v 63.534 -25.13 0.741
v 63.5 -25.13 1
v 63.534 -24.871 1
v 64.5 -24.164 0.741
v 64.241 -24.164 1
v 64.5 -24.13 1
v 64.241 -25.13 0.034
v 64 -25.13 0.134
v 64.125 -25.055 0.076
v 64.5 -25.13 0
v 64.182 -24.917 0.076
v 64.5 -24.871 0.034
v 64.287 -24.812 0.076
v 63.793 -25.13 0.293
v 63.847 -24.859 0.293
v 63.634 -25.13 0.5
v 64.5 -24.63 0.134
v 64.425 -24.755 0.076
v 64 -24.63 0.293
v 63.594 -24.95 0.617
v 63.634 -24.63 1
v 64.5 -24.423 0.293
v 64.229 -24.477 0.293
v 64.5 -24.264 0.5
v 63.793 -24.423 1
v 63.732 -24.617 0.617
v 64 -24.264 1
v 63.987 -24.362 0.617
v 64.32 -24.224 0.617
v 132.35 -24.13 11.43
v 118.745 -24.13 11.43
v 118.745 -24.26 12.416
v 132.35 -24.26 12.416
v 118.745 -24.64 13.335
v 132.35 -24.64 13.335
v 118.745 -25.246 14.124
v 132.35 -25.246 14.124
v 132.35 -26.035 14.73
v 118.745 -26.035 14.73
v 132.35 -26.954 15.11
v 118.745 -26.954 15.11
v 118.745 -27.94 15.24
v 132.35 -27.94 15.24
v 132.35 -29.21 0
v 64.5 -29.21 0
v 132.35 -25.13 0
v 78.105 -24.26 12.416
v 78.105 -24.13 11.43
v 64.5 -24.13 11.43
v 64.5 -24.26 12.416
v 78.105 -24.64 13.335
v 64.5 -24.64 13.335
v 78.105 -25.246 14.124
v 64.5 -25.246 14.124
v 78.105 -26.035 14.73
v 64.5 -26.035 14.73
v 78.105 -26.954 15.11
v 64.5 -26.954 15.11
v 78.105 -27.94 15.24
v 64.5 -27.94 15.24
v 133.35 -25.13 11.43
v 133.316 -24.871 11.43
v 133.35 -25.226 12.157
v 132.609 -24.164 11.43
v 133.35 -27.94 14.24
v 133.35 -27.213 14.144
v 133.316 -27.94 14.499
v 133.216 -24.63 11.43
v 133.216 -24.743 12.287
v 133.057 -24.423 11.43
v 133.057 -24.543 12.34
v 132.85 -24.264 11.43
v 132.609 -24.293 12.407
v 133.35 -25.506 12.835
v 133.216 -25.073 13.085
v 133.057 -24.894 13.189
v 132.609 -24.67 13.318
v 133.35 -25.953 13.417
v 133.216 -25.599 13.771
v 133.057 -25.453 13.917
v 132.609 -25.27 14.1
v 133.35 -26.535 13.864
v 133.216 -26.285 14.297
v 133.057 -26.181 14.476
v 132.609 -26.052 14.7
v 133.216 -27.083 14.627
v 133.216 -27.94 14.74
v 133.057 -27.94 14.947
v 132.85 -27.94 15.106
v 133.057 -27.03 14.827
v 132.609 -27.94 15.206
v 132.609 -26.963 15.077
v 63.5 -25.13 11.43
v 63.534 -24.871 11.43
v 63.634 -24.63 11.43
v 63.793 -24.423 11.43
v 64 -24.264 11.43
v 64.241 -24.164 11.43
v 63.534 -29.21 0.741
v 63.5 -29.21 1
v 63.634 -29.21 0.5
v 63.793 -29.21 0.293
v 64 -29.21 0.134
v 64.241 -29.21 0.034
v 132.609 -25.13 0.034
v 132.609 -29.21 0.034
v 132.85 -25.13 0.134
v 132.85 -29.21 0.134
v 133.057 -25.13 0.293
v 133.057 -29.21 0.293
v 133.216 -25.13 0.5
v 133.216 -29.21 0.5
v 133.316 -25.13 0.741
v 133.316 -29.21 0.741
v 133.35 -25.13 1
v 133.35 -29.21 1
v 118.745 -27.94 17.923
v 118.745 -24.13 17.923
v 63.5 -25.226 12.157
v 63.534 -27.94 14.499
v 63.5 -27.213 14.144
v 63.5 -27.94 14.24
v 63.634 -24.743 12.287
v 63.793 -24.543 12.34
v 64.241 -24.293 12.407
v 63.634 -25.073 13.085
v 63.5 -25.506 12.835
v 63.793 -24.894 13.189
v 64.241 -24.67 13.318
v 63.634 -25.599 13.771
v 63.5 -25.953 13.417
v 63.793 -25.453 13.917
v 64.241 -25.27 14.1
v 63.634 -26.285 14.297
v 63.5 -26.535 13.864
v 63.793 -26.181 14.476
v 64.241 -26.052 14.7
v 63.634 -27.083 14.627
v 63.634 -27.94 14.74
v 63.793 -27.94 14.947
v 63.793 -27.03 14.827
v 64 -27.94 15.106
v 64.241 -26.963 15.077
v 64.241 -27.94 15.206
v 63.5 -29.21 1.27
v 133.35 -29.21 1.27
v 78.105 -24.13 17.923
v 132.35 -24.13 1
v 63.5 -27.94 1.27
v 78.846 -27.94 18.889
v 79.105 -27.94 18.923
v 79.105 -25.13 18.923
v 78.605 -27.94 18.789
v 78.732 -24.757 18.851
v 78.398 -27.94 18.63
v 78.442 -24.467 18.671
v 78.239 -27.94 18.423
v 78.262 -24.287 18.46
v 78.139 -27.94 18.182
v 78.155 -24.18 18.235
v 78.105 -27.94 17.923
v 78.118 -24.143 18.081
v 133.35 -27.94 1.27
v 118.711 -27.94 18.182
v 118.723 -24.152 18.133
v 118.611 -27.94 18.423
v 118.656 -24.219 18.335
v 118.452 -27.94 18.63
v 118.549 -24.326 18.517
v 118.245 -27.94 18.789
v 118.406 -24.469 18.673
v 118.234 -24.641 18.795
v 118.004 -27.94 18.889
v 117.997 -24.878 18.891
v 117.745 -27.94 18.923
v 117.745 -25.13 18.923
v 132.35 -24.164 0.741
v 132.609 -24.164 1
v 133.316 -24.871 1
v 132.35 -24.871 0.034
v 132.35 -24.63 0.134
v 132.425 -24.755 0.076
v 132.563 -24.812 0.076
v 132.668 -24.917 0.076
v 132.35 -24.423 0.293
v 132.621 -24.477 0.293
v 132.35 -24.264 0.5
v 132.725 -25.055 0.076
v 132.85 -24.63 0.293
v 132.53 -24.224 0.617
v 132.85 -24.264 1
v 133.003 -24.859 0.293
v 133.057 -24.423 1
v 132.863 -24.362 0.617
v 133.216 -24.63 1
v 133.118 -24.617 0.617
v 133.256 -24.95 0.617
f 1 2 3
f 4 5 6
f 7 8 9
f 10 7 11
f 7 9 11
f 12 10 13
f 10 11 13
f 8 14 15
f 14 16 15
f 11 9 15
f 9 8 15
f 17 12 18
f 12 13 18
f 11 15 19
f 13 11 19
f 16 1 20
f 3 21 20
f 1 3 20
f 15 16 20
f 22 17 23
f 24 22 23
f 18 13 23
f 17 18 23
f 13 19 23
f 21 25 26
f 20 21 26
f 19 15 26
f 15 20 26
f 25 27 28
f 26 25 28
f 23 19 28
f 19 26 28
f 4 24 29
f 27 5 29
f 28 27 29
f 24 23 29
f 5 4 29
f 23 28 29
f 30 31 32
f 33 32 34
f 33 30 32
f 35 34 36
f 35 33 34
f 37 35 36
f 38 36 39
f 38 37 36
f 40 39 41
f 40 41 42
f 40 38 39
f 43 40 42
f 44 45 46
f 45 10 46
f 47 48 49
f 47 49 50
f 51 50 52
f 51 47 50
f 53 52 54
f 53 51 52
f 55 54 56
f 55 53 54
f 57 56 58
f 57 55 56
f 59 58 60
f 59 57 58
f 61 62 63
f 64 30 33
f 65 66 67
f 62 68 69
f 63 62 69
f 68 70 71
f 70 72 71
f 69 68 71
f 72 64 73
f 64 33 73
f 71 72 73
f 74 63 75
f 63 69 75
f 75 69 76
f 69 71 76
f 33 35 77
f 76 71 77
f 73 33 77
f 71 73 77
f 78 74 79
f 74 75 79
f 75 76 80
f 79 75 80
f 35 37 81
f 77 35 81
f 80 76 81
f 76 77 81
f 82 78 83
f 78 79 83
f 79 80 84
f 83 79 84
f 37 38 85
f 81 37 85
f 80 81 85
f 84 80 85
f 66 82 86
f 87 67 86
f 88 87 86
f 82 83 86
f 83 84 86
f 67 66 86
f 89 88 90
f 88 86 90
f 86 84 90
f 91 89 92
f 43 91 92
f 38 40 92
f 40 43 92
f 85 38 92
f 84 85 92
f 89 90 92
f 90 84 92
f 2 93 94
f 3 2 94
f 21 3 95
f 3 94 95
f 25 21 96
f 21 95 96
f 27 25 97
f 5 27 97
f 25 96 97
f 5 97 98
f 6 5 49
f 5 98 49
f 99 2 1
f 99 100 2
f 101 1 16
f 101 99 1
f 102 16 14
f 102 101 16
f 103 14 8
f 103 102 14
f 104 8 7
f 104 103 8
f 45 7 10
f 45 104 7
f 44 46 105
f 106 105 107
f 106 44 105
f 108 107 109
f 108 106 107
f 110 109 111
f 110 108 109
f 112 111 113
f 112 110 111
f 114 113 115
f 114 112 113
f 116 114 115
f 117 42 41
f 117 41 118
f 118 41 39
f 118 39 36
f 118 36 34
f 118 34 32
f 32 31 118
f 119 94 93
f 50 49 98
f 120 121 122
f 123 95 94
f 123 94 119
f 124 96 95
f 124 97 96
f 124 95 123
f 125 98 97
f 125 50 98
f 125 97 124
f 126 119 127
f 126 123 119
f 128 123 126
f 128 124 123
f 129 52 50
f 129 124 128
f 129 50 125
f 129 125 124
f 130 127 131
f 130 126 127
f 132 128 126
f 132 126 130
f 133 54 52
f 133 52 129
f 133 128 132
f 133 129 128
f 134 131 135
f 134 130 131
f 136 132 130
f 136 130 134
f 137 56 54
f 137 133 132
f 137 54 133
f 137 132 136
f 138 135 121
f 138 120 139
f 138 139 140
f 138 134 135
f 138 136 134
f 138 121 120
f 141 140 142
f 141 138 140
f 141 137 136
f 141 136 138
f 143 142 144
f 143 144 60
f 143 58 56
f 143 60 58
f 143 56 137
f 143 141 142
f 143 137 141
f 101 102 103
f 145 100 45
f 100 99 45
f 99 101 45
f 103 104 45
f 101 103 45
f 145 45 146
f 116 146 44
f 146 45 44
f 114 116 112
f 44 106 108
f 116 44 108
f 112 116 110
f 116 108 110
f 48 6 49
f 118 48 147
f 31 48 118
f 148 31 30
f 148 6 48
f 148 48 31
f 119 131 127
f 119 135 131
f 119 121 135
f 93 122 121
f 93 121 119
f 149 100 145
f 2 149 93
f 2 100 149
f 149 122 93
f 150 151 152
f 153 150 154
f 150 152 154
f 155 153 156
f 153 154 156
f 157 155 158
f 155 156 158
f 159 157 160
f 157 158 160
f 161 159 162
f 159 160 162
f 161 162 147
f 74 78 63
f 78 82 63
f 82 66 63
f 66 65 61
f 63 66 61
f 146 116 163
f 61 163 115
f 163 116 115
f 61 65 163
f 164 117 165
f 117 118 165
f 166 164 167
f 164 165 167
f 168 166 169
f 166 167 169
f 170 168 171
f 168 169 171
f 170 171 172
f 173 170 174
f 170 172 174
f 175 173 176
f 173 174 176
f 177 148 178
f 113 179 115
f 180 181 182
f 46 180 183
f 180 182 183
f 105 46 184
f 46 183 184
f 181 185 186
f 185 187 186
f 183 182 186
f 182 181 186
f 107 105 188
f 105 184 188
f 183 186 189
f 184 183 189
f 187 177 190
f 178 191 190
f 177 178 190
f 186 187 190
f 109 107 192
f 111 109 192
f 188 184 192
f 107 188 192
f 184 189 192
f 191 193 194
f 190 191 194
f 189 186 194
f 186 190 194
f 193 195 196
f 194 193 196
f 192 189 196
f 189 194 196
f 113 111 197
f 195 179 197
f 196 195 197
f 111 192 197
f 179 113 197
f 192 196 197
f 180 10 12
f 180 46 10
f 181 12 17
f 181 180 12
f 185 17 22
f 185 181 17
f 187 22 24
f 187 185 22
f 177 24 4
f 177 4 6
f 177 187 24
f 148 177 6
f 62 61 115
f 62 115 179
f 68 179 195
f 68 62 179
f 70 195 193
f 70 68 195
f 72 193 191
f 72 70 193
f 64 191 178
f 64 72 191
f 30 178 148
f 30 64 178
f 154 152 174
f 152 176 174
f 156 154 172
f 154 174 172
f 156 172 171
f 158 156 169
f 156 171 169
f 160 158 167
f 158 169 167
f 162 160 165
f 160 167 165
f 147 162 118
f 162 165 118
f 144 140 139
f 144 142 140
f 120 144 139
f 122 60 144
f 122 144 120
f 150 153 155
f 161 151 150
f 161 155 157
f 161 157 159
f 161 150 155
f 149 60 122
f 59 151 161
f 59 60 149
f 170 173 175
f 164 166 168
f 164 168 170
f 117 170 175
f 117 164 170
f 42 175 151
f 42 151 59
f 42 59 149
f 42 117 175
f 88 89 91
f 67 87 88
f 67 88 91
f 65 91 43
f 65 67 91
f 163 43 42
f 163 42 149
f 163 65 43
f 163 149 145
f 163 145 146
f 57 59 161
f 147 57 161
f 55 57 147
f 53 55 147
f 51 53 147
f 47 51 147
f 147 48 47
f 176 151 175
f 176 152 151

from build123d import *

# Parameters (mm, degrees)
EXTRUDE003_DEPTH = 69.85
BOX024_W         = 40.64
BOX024_H         = 3.81
BOX024_DEPTH     = 7.62
BOX025_W         = 69.85
BOX025_H         = 1.27
BOX025_DEPTH     = 1.27
BOX023_W         = 69.85
BOX023_H         = 3.81
BOX023_DEPTH     = 11.43
FILLET002_R      = 1


with BuildPart() as extrude003:
    # Sketch001 (on Face2 of Box023) → Extrude003 (new body)
    with BuildSketch(Plane.YZ.offset(69.85)):
        with BuildLine():
            ThreePointArc((3.81, 11.43), (2.694077, 14.124077), (0, 15.24))
            Line((0, 15.24), (0, 11.43))
            Line((0, 11.43), (3.81, 11.43))
        make_face()
    extrude(amount=-EXTRUDE003_DEPTH)


with BuildPart() as cube024:
    # Box024 → Box024 (new body)
    with BuildSketch(Plane(origin=(14.605, 0, 11.303), x_dir=(1, 0, 0), z_dir=(0, 0, 1))):
        with Locations((20.32, 1.905)):
            Rectangle(BOX024_W, BOX024_H)
    extrude(amount=BOX024_DEPTH)


with BuildPart() as cube025:
    # Box025 → Box025 (new body)
    with BuildSketch(Plane(origin=(0, -1.27, 0), x_dir=(1, 0, 0), z_dir=(0, 0, 1))):
        with Locations((34.925, 0.635)):
            Rectangle(BOX025_W, BOX025_H)
    extrude(amount=BOX025_DEPTH)


with BuildPart() as fillet002:
    # Box023 → Box023 (new body)
    with BuildSketch(Plane.XY):
        with Locations((34.925, 1.905)):
            Rectangle(BOX023_W, BOX023_H)
    extrude(amount=BOX023_DEPTH)

    # Fusion019: union Extrude003, Cube024, Cube025
    add(extrude003.part)
    add(cube024.part)
    add(cube025.part)

    # Fillet002
    fillet002_edges = [fillet002.edges().sort_by_distance(p)[0] for p in [
        (0, 3.81, 5.715),
        (0, 1.905, 0),
        (0, -0.635, 0),
        (0, 2.694077, 14.124077),
        (69.85, 3.81, 5.715),
        (34.925, 3.81, 0),
        (69.85, 1.905, 0),
        (69.85, -0.635, 0),
        (69.85, 2.694077, 14.124077),
        (14.605, 1.905, 18.923),
        (55.245, 1.905, 18.923),
        (34.925, 3.81, 18.923),
    ]]
    fillet(fillet002_edges, radius=FILLET002_R)


with BuildPart() as fillet002_1:
    # Fillet002 placement: moved
    add(fillet002.part.moved(Location((63.5, -27.94, 0))))


solid = fillet002_1.part
